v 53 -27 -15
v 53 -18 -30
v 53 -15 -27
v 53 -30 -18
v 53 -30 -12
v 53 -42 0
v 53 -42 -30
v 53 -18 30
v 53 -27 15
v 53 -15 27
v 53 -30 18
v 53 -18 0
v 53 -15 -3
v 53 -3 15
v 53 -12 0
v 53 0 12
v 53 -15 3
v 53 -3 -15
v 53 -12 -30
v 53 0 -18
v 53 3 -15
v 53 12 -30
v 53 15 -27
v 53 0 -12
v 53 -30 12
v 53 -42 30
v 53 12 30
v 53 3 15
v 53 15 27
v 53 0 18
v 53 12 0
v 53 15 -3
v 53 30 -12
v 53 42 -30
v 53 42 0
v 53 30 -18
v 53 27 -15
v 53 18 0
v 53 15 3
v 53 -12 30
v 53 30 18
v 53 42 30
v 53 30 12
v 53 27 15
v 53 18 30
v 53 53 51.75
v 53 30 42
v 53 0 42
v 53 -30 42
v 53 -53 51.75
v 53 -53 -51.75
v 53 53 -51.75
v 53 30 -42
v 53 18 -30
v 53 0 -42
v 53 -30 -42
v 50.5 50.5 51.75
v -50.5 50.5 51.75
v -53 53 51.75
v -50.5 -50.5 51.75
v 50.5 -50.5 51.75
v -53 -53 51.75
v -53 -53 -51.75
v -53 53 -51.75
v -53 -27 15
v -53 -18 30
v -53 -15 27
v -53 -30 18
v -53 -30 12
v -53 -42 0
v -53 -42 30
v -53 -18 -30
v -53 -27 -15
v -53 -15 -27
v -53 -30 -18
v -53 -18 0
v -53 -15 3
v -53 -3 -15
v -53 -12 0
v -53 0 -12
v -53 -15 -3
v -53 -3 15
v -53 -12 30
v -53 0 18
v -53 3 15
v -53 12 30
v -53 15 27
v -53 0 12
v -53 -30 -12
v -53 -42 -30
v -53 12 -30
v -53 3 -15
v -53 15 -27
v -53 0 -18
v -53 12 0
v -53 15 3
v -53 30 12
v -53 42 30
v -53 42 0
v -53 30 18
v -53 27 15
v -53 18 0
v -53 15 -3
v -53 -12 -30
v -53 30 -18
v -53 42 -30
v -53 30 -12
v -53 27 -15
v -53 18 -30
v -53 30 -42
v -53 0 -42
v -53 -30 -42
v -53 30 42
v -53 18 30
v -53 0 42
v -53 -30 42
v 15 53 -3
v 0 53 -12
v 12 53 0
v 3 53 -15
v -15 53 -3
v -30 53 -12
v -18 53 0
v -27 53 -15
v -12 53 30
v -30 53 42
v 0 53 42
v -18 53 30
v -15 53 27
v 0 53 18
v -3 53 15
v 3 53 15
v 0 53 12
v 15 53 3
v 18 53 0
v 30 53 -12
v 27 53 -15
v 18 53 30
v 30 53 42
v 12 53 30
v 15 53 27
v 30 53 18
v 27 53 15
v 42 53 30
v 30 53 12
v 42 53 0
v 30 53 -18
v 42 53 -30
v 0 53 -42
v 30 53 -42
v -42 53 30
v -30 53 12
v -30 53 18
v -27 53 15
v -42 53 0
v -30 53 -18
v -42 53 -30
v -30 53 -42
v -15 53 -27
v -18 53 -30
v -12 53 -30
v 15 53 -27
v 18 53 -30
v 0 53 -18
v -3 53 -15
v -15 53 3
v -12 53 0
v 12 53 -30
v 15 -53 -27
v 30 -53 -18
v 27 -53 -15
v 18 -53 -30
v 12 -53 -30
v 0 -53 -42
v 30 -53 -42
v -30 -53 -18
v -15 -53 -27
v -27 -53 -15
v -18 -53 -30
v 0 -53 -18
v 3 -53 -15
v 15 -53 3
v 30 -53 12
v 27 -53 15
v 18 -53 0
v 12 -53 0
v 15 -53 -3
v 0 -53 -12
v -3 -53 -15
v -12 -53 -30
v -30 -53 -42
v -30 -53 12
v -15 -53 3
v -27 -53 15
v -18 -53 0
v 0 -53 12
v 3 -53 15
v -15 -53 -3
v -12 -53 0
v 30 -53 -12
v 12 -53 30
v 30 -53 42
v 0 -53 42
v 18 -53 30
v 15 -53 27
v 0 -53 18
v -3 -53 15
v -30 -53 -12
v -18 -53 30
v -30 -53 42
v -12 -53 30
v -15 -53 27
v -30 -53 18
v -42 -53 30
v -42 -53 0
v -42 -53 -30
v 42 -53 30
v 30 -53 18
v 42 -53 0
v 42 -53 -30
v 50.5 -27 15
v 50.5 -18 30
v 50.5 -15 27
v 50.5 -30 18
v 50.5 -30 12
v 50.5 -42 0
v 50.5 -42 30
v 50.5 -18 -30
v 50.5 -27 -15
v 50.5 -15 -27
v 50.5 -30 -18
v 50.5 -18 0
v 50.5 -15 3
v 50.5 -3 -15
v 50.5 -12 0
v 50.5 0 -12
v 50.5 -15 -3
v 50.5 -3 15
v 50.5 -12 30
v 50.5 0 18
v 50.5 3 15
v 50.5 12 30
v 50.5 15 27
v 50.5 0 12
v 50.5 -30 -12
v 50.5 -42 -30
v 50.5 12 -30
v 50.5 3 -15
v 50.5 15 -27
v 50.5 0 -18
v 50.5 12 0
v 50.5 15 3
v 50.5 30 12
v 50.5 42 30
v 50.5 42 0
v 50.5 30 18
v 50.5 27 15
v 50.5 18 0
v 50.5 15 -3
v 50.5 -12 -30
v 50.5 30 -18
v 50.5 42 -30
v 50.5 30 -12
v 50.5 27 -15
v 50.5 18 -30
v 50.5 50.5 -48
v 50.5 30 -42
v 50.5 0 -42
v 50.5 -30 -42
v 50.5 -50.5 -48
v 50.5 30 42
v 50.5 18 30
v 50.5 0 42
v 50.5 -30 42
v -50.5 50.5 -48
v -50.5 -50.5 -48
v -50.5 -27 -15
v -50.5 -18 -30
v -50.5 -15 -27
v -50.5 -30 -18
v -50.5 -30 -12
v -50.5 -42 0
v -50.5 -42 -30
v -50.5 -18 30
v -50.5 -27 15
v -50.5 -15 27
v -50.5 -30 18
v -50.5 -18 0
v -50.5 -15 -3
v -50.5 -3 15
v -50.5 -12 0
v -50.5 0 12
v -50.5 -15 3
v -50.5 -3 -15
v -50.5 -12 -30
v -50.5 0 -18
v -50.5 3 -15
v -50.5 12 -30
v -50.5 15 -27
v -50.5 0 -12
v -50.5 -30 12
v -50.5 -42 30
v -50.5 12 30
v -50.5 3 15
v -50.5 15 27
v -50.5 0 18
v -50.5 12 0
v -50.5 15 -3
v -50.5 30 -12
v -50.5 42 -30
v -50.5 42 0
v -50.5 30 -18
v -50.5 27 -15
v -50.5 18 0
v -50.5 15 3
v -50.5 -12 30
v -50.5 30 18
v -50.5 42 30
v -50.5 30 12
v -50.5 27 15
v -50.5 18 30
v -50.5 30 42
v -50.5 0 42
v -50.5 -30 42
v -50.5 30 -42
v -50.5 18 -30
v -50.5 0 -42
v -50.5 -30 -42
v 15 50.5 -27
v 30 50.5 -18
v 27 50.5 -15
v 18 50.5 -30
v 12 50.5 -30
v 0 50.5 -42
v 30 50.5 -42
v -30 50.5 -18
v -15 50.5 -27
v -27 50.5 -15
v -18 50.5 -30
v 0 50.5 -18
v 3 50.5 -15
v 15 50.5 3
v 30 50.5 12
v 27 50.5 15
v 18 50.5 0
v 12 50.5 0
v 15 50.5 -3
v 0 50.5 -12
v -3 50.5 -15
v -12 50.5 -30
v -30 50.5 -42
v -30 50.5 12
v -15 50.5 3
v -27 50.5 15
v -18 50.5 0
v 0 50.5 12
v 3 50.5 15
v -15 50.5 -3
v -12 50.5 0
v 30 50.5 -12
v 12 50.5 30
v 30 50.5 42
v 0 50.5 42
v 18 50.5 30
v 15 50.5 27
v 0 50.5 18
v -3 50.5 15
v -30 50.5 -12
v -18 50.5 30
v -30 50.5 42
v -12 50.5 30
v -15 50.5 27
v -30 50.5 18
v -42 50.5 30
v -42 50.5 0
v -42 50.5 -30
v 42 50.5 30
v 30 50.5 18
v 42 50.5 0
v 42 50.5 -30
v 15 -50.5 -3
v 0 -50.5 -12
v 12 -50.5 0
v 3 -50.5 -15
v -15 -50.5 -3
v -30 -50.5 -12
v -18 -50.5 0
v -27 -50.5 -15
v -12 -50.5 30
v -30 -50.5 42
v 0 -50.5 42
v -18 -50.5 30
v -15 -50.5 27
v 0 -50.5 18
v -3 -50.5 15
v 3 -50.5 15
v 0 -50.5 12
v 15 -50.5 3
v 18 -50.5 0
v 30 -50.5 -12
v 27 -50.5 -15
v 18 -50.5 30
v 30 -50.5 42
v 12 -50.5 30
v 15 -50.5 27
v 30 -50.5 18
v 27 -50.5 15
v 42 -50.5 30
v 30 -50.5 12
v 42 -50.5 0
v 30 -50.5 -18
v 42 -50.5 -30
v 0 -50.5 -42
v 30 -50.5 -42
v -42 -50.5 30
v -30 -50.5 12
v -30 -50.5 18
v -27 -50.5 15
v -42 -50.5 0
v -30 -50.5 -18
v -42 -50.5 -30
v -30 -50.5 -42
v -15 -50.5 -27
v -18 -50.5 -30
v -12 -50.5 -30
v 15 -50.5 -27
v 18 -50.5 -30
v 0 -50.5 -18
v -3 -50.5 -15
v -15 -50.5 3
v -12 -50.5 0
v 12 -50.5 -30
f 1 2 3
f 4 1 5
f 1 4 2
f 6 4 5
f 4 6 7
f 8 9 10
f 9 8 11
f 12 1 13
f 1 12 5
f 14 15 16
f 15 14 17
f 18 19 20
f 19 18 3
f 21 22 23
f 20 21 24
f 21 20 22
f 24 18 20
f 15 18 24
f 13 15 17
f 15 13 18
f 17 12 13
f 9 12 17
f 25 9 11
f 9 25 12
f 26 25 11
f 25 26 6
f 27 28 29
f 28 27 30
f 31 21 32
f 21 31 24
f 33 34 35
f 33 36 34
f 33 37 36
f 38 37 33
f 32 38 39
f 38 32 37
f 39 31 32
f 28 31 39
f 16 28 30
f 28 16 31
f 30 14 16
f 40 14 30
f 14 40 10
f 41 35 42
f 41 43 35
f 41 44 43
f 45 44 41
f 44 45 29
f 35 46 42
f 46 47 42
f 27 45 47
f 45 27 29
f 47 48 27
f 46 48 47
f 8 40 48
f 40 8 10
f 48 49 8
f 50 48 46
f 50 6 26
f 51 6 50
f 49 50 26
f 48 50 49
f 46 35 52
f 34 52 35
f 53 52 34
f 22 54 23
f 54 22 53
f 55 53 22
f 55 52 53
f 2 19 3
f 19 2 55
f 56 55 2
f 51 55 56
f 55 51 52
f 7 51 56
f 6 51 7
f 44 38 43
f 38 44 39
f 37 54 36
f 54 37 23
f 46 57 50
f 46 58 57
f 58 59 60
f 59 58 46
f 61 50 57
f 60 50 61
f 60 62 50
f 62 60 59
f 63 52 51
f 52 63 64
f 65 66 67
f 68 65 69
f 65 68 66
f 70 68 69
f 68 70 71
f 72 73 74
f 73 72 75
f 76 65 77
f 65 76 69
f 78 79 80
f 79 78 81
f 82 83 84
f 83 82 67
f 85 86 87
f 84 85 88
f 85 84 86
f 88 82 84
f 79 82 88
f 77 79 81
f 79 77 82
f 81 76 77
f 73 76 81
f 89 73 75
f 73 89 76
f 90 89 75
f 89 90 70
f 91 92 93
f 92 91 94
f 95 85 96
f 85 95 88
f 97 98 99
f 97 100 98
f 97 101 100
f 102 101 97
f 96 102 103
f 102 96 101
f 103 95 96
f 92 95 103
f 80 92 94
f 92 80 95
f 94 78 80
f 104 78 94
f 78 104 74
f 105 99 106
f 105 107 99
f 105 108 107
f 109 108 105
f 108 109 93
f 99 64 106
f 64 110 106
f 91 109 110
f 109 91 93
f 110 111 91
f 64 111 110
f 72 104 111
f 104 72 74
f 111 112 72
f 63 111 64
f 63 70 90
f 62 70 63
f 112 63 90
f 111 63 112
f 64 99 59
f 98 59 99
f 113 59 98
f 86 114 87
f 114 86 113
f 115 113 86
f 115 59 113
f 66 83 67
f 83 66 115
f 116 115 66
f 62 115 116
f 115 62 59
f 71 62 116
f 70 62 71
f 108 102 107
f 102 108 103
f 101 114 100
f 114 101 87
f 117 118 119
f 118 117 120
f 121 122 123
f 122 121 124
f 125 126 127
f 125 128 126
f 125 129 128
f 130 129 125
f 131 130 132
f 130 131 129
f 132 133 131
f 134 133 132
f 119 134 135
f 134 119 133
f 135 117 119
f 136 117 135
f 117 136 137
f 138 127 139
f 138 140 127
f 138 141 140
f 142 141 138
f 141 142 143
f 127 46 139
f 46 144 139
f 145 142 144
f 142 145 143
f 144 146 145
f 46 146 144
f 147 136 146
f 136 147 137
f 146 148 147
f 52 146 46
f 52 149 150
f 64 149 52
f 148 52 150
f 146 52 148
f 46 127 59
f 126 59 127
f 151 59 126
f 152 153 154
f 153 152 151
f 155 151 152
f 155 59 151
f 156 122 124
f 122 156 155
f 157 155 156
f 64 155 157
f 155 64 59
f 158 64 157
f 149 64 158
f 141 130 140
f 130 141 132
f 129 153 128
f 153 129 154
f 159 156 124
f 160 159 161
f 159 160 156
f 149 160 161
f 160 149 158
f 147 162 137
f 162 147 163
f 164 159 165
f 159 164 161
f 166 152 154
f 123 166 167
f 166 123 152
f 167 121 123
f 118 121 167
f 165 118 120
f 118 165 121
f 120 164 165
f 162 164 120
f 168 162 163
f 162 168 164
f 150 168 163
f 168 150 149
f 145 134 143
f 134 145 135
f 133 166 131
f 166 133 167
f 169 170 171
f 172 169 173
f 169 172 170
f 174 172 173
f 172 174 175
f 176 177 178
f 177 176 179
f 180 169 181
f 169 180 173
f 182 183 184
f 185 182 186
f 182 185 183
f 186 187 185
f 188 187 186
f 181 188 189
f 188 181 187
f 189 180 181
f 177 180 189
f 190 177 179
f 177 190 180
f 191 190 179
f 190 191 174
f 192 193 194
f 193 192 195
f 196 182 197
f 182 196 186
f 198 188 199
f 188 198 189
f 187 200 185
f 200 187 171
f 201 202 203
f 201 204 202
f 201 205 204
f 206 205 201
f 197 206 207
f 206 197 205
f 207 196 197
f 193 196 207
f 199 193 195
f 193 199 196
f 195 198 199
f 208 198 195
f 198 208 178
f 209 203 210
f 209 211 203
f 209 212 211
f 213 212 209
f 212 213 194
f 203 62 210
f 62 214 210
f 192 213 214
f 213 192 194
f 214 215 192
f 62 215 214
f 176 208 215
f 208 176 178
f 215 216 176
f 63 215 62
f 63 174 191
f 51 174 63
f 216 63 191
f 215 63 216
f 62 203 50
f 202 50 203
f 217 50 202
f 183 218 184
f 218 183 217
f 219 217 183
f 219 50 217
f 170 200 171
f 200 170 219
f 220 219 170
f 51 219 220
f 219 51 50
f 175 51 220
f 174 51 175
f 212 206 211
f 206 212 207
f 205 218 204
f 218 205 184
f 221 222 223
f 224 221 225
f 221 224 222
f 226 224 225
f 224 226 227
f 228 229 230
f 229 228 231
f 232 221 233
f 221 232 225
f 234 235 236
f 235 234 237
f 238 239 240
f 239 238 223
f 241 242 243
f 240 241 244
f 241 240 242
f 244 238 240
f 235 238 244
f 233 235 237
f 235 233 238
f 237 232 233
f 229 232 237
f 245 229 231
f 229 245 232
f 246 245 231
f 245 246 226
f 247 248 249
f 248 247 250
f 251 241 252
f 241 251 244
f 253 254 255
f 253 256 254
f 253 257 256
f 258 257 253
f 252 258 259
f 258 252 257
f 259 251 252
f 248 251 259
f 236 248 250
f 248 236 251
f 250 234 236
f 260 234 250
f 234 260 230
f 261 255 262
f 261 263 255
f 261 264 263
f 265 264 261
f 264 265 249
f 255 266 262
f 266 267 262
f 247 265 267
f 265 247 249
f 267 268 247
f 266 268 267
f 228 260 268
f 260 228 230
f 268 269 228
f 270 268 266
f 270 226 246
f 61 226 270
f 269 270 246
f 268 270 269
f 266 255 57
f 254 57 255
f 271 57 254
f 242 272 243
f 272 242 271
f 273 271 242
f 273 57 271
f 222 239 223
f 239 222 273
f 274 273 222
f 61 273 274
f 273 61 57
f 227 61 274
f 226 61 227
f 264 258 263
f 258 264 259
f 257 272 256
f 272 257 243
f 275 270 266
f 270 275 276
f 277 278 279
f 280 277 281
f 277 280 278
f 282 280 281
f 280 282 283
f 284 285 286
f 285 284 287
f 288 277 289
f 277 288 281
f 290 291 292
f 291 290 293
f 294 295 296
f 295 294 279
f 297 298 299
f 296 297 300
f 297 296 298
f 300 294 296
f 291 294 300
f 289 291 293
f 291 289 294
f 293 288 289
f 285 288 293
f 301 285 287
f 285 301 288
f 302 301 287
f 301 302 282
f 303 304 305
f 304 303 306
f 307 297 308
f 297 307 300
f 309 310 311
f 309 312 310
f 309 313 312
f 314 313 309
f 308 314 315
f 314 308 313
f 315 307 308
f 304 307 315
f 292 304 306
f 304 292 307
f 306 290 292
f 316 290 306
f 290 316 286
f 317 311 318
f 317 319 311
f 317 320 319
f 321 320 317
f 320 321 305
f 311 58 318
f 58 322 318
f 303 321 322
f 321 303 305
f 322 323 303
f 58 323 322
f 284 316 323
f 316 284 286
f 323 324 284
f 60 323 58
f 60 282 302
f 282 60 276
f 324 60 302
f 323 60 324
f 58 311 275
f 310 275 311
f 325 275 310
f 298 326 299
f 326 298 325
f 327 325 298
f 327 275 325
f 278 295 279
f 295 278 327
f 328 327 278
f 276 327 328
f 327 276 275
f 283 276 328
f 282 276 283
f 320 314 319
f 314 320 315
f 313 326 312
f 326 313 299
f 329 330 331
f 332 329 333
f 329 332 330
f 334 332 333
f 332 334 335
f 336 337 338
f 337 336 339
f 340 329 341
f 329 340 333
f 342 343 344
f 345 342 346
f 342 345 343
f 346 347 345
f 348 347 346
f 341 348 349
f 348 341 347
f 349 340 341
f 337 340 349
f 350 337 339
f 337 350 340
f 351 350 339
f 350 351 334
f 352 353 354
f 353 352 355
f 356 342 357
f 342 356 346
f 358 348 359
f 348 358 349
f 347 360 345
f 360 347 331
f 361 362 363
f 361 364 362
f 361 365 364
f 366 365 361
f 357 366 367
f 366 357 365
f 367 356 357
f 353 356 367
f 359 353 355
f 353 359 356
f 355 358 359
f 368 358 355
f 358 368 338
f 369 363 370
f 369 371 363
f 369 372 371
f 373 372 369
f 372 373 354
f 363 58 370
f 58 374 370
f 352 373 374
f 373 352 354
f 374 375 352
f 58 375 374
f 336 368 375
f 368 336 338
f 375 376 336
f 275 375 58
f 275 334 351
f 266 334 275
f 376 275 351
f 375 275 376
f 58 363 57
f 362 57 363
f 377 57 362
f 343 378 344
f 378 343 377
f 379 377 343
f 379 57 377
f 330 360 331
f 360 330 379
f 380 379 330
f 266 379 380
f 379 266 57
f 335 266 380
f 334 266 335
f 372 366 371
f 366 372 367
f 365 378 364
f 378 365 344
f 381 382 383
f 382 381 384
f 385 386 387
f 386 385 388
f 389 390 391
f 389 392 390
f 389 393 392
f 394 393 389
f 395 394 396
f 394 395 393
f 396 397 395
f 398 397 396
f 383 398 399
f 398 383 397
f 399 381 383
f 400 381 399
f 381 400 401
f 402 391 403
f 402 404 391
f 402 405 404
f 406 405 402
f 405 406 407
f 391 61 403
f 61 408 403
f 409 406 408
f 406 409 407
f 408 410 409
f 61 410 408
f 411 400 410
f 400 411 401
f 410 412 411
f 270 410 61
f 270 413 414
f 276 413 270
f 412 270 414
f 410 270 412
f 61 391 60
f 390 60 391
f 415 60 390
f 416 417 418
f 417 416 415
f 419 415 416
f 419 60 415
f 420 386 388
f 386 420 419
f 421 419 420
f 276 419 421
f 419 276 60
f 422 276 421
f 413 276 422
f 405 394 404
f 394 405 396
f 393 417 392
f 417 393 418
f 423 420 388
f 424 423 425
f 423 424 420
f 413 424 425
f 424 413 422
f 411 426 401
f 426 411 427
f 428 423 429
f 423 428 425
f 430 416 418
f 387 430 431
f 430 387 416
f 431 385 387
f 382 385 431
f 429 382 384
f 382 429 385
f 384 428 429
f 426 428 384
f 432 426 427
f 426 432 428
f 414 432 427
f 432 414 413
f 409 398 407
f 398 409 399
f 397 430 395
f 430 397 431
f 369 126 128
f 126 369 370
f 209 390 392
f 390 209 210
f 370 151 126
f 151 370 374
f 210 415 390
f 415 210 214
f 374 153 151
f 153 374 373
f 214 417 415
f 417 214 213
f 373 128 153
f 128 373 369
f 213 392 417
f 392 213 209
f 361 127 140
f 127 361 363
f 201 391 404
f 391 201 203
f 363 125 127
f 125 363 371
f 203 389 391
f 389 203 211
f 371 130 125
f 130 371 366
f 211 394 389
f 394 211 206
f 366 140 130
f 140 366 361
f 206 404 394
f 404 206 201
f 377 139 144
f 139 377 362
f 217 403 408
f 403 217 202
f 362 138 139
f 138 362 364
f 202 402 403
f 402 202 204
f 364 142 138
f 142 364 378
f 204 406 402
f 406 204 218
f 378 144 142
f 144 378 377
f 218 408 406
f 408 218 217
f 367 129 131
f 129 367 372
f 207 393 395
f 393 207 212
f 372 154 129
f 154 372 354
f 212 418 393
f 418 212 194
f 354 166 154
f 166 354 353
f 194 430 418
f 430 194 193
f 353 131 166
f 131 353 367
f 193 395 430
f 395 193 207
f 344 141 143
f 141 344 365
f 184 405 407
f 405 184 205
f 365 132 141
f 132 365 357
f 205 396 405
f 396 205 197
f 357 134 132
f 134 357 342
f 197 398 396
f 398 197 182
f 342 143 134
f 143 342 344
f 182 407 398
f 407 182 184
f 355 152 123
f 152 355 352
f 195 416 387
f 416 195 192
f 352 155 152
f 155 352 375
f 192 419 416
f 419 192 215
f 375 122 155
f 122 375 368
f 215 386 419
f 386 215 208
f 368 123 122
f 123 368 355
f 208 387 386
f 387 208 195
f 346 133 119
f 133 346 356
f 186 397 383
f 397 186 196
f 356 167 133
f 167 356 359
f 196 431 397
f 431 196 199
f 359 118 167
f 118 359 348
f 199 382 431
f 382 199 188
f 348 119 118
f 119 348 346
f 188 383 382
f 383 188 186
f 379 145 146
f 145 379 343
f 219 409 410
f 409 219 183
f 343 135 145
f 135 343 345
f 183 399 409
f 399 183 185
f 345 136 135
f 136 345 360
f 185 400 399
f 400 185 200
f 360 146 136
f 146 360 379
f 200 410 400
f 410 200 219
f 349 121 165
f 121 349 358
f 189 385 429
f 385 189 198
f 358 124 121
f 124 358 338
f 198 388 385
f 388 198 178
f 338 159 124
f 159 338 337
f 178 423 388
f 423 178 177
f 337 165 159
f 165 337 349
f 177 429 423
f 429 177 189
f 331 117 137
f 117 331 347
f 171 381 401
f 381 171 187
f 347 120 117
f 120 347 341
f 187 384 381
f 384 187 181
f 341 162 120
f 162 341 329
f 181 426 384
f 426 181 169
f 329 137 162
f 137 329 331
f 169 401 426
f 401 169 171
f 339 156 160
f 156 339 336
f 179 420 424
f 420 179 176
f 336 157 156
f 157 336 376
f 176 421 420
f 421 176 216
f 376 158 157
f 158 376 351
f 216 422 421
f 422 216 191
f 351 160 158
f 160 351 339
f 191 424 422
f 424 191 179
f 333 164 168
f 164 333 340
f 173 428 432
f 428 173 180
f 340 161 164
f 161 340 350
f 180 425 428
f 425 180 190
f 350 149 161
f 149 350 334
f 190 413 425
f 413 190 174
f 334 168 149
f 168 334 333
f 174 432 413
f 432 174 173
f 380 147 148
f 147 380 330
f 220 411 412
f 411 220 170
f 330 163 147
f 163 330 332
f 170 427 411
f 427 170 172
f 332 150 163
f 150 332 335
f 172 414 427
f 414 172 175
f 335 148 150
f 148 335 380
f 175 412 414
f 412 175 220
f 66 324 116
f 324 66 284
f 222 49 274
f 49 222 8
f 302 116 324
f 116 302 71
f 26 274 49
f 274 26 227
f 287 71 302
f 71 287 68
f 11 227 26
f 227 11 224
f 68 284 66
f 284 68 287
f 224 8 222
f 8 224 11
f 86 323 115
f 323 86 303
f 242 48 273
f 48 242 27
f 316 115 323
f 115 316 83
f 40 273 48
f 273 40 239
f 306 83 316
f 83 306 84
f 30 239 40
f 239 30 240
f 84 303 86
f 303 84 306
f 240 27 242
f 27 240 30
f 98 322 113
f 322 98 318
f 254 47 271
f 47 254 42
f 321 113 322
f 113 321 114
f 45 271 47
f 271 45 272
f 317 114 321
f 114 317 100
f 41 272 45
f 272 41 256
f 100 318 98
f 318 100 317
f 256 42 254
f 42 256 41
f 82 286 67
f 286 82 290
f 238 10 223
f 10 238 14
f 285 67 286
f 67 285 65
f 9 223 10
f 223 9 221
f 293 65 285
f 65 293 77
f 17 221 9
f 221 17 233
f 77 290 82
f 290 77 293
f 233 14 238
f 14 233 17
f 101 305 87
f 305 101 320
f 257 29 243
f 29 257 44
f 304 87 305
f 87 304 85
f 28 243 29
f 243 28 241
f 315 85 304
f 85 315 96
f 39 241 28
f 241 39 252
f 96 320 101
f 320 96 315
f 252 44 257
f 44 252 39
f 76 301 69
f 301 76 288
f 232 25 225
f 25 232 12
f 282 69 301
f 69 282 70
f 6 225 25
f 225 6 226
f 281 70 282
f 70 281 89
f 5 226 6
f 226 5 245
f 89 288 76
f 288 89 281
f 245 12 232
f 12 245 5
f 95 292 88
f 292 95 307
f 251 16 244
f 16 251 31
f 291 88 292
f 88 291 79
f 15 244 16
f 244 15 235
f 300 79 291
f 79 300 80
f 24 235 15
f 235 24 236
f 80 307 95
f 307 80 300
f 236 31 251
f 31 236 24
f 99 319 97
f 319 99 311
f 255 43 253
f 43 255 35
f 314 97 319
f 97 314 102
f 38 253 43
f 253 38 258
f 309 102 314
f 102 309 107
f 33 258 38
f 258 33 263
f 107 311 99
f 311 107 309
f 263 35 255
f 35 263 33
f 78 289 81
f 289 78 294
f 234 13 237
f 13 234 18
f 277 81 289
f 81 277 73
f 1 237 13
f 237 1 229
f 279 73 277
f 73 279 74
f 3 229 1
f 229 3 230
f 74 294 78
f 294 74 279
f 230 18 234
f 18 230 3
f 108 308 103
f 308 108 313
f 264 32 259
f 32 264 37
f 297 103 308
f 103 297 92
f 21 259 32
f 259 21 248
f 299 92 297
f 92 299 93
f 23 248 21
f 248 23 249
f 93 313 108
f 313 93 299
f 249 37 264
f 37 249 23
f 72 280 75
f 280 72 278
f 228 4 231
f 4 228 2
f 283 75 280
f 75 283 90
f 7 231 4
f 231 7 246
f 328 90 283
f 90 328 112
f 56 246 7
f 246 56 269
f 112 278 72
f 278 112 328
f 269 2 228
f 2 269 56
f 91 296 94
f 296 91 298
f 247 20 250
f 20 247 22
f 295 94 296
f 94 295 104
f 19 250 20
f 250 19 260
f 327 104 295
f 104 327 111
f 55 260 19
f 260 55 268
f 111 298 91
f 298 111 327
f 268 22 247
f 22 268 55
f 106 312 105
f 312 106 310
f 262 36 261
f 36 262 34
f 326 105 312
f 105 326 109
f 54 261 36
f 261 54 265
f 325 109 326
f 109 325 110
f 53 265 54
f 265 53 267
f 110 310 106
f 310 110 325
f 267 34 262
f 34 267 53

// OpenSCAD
side_dimension = 101;

wall_thickness = 2.5;

module diamond(x,y) {
    polygon(
        points=[
            [x, 0], [0,-y],
            [-x,0], [0,y]
            ],
        paths=[ [0,1,2,3] ]
        );
}

module cutouts() {
    cutsize = side_dimension - 8.0;
    verybig = 200.0;
    holesize = 12.0;
    spacing = 6.0;
    diagspace = holesize * 2 + spacing;
    rotate([90,0,0])
    {
        linear_extrude(height=verybig, center=true, convexity=5)
        {
            for (y=[-1:1]) {
                for (x=[-1:1]) {
                    translate([x*diagspace,y*diagspace])
                        diamond(holesize, holesize);
                }
                if (y<1) {
                for (x=[-0.5:0.5]) {
                    translate([x*diagspace,(y+0.5)*diagspace])
                        diamond(holesize, holesize);
                }
                }
            }
        }
    }
}

module main()
{
    side_outer = side_dimension + wall_thickness*2;
    difference() {
        cube([side_outer, side_outer, side_dimension + wall_thickness],
            center=true);
        translate([0,0,wall_thickness])
            cube([side_dimension, side_dimension,side_dimension,], center=true);
        cutouts();
        rotate([0,0,90])
            cutouts();
    }
}

main();
